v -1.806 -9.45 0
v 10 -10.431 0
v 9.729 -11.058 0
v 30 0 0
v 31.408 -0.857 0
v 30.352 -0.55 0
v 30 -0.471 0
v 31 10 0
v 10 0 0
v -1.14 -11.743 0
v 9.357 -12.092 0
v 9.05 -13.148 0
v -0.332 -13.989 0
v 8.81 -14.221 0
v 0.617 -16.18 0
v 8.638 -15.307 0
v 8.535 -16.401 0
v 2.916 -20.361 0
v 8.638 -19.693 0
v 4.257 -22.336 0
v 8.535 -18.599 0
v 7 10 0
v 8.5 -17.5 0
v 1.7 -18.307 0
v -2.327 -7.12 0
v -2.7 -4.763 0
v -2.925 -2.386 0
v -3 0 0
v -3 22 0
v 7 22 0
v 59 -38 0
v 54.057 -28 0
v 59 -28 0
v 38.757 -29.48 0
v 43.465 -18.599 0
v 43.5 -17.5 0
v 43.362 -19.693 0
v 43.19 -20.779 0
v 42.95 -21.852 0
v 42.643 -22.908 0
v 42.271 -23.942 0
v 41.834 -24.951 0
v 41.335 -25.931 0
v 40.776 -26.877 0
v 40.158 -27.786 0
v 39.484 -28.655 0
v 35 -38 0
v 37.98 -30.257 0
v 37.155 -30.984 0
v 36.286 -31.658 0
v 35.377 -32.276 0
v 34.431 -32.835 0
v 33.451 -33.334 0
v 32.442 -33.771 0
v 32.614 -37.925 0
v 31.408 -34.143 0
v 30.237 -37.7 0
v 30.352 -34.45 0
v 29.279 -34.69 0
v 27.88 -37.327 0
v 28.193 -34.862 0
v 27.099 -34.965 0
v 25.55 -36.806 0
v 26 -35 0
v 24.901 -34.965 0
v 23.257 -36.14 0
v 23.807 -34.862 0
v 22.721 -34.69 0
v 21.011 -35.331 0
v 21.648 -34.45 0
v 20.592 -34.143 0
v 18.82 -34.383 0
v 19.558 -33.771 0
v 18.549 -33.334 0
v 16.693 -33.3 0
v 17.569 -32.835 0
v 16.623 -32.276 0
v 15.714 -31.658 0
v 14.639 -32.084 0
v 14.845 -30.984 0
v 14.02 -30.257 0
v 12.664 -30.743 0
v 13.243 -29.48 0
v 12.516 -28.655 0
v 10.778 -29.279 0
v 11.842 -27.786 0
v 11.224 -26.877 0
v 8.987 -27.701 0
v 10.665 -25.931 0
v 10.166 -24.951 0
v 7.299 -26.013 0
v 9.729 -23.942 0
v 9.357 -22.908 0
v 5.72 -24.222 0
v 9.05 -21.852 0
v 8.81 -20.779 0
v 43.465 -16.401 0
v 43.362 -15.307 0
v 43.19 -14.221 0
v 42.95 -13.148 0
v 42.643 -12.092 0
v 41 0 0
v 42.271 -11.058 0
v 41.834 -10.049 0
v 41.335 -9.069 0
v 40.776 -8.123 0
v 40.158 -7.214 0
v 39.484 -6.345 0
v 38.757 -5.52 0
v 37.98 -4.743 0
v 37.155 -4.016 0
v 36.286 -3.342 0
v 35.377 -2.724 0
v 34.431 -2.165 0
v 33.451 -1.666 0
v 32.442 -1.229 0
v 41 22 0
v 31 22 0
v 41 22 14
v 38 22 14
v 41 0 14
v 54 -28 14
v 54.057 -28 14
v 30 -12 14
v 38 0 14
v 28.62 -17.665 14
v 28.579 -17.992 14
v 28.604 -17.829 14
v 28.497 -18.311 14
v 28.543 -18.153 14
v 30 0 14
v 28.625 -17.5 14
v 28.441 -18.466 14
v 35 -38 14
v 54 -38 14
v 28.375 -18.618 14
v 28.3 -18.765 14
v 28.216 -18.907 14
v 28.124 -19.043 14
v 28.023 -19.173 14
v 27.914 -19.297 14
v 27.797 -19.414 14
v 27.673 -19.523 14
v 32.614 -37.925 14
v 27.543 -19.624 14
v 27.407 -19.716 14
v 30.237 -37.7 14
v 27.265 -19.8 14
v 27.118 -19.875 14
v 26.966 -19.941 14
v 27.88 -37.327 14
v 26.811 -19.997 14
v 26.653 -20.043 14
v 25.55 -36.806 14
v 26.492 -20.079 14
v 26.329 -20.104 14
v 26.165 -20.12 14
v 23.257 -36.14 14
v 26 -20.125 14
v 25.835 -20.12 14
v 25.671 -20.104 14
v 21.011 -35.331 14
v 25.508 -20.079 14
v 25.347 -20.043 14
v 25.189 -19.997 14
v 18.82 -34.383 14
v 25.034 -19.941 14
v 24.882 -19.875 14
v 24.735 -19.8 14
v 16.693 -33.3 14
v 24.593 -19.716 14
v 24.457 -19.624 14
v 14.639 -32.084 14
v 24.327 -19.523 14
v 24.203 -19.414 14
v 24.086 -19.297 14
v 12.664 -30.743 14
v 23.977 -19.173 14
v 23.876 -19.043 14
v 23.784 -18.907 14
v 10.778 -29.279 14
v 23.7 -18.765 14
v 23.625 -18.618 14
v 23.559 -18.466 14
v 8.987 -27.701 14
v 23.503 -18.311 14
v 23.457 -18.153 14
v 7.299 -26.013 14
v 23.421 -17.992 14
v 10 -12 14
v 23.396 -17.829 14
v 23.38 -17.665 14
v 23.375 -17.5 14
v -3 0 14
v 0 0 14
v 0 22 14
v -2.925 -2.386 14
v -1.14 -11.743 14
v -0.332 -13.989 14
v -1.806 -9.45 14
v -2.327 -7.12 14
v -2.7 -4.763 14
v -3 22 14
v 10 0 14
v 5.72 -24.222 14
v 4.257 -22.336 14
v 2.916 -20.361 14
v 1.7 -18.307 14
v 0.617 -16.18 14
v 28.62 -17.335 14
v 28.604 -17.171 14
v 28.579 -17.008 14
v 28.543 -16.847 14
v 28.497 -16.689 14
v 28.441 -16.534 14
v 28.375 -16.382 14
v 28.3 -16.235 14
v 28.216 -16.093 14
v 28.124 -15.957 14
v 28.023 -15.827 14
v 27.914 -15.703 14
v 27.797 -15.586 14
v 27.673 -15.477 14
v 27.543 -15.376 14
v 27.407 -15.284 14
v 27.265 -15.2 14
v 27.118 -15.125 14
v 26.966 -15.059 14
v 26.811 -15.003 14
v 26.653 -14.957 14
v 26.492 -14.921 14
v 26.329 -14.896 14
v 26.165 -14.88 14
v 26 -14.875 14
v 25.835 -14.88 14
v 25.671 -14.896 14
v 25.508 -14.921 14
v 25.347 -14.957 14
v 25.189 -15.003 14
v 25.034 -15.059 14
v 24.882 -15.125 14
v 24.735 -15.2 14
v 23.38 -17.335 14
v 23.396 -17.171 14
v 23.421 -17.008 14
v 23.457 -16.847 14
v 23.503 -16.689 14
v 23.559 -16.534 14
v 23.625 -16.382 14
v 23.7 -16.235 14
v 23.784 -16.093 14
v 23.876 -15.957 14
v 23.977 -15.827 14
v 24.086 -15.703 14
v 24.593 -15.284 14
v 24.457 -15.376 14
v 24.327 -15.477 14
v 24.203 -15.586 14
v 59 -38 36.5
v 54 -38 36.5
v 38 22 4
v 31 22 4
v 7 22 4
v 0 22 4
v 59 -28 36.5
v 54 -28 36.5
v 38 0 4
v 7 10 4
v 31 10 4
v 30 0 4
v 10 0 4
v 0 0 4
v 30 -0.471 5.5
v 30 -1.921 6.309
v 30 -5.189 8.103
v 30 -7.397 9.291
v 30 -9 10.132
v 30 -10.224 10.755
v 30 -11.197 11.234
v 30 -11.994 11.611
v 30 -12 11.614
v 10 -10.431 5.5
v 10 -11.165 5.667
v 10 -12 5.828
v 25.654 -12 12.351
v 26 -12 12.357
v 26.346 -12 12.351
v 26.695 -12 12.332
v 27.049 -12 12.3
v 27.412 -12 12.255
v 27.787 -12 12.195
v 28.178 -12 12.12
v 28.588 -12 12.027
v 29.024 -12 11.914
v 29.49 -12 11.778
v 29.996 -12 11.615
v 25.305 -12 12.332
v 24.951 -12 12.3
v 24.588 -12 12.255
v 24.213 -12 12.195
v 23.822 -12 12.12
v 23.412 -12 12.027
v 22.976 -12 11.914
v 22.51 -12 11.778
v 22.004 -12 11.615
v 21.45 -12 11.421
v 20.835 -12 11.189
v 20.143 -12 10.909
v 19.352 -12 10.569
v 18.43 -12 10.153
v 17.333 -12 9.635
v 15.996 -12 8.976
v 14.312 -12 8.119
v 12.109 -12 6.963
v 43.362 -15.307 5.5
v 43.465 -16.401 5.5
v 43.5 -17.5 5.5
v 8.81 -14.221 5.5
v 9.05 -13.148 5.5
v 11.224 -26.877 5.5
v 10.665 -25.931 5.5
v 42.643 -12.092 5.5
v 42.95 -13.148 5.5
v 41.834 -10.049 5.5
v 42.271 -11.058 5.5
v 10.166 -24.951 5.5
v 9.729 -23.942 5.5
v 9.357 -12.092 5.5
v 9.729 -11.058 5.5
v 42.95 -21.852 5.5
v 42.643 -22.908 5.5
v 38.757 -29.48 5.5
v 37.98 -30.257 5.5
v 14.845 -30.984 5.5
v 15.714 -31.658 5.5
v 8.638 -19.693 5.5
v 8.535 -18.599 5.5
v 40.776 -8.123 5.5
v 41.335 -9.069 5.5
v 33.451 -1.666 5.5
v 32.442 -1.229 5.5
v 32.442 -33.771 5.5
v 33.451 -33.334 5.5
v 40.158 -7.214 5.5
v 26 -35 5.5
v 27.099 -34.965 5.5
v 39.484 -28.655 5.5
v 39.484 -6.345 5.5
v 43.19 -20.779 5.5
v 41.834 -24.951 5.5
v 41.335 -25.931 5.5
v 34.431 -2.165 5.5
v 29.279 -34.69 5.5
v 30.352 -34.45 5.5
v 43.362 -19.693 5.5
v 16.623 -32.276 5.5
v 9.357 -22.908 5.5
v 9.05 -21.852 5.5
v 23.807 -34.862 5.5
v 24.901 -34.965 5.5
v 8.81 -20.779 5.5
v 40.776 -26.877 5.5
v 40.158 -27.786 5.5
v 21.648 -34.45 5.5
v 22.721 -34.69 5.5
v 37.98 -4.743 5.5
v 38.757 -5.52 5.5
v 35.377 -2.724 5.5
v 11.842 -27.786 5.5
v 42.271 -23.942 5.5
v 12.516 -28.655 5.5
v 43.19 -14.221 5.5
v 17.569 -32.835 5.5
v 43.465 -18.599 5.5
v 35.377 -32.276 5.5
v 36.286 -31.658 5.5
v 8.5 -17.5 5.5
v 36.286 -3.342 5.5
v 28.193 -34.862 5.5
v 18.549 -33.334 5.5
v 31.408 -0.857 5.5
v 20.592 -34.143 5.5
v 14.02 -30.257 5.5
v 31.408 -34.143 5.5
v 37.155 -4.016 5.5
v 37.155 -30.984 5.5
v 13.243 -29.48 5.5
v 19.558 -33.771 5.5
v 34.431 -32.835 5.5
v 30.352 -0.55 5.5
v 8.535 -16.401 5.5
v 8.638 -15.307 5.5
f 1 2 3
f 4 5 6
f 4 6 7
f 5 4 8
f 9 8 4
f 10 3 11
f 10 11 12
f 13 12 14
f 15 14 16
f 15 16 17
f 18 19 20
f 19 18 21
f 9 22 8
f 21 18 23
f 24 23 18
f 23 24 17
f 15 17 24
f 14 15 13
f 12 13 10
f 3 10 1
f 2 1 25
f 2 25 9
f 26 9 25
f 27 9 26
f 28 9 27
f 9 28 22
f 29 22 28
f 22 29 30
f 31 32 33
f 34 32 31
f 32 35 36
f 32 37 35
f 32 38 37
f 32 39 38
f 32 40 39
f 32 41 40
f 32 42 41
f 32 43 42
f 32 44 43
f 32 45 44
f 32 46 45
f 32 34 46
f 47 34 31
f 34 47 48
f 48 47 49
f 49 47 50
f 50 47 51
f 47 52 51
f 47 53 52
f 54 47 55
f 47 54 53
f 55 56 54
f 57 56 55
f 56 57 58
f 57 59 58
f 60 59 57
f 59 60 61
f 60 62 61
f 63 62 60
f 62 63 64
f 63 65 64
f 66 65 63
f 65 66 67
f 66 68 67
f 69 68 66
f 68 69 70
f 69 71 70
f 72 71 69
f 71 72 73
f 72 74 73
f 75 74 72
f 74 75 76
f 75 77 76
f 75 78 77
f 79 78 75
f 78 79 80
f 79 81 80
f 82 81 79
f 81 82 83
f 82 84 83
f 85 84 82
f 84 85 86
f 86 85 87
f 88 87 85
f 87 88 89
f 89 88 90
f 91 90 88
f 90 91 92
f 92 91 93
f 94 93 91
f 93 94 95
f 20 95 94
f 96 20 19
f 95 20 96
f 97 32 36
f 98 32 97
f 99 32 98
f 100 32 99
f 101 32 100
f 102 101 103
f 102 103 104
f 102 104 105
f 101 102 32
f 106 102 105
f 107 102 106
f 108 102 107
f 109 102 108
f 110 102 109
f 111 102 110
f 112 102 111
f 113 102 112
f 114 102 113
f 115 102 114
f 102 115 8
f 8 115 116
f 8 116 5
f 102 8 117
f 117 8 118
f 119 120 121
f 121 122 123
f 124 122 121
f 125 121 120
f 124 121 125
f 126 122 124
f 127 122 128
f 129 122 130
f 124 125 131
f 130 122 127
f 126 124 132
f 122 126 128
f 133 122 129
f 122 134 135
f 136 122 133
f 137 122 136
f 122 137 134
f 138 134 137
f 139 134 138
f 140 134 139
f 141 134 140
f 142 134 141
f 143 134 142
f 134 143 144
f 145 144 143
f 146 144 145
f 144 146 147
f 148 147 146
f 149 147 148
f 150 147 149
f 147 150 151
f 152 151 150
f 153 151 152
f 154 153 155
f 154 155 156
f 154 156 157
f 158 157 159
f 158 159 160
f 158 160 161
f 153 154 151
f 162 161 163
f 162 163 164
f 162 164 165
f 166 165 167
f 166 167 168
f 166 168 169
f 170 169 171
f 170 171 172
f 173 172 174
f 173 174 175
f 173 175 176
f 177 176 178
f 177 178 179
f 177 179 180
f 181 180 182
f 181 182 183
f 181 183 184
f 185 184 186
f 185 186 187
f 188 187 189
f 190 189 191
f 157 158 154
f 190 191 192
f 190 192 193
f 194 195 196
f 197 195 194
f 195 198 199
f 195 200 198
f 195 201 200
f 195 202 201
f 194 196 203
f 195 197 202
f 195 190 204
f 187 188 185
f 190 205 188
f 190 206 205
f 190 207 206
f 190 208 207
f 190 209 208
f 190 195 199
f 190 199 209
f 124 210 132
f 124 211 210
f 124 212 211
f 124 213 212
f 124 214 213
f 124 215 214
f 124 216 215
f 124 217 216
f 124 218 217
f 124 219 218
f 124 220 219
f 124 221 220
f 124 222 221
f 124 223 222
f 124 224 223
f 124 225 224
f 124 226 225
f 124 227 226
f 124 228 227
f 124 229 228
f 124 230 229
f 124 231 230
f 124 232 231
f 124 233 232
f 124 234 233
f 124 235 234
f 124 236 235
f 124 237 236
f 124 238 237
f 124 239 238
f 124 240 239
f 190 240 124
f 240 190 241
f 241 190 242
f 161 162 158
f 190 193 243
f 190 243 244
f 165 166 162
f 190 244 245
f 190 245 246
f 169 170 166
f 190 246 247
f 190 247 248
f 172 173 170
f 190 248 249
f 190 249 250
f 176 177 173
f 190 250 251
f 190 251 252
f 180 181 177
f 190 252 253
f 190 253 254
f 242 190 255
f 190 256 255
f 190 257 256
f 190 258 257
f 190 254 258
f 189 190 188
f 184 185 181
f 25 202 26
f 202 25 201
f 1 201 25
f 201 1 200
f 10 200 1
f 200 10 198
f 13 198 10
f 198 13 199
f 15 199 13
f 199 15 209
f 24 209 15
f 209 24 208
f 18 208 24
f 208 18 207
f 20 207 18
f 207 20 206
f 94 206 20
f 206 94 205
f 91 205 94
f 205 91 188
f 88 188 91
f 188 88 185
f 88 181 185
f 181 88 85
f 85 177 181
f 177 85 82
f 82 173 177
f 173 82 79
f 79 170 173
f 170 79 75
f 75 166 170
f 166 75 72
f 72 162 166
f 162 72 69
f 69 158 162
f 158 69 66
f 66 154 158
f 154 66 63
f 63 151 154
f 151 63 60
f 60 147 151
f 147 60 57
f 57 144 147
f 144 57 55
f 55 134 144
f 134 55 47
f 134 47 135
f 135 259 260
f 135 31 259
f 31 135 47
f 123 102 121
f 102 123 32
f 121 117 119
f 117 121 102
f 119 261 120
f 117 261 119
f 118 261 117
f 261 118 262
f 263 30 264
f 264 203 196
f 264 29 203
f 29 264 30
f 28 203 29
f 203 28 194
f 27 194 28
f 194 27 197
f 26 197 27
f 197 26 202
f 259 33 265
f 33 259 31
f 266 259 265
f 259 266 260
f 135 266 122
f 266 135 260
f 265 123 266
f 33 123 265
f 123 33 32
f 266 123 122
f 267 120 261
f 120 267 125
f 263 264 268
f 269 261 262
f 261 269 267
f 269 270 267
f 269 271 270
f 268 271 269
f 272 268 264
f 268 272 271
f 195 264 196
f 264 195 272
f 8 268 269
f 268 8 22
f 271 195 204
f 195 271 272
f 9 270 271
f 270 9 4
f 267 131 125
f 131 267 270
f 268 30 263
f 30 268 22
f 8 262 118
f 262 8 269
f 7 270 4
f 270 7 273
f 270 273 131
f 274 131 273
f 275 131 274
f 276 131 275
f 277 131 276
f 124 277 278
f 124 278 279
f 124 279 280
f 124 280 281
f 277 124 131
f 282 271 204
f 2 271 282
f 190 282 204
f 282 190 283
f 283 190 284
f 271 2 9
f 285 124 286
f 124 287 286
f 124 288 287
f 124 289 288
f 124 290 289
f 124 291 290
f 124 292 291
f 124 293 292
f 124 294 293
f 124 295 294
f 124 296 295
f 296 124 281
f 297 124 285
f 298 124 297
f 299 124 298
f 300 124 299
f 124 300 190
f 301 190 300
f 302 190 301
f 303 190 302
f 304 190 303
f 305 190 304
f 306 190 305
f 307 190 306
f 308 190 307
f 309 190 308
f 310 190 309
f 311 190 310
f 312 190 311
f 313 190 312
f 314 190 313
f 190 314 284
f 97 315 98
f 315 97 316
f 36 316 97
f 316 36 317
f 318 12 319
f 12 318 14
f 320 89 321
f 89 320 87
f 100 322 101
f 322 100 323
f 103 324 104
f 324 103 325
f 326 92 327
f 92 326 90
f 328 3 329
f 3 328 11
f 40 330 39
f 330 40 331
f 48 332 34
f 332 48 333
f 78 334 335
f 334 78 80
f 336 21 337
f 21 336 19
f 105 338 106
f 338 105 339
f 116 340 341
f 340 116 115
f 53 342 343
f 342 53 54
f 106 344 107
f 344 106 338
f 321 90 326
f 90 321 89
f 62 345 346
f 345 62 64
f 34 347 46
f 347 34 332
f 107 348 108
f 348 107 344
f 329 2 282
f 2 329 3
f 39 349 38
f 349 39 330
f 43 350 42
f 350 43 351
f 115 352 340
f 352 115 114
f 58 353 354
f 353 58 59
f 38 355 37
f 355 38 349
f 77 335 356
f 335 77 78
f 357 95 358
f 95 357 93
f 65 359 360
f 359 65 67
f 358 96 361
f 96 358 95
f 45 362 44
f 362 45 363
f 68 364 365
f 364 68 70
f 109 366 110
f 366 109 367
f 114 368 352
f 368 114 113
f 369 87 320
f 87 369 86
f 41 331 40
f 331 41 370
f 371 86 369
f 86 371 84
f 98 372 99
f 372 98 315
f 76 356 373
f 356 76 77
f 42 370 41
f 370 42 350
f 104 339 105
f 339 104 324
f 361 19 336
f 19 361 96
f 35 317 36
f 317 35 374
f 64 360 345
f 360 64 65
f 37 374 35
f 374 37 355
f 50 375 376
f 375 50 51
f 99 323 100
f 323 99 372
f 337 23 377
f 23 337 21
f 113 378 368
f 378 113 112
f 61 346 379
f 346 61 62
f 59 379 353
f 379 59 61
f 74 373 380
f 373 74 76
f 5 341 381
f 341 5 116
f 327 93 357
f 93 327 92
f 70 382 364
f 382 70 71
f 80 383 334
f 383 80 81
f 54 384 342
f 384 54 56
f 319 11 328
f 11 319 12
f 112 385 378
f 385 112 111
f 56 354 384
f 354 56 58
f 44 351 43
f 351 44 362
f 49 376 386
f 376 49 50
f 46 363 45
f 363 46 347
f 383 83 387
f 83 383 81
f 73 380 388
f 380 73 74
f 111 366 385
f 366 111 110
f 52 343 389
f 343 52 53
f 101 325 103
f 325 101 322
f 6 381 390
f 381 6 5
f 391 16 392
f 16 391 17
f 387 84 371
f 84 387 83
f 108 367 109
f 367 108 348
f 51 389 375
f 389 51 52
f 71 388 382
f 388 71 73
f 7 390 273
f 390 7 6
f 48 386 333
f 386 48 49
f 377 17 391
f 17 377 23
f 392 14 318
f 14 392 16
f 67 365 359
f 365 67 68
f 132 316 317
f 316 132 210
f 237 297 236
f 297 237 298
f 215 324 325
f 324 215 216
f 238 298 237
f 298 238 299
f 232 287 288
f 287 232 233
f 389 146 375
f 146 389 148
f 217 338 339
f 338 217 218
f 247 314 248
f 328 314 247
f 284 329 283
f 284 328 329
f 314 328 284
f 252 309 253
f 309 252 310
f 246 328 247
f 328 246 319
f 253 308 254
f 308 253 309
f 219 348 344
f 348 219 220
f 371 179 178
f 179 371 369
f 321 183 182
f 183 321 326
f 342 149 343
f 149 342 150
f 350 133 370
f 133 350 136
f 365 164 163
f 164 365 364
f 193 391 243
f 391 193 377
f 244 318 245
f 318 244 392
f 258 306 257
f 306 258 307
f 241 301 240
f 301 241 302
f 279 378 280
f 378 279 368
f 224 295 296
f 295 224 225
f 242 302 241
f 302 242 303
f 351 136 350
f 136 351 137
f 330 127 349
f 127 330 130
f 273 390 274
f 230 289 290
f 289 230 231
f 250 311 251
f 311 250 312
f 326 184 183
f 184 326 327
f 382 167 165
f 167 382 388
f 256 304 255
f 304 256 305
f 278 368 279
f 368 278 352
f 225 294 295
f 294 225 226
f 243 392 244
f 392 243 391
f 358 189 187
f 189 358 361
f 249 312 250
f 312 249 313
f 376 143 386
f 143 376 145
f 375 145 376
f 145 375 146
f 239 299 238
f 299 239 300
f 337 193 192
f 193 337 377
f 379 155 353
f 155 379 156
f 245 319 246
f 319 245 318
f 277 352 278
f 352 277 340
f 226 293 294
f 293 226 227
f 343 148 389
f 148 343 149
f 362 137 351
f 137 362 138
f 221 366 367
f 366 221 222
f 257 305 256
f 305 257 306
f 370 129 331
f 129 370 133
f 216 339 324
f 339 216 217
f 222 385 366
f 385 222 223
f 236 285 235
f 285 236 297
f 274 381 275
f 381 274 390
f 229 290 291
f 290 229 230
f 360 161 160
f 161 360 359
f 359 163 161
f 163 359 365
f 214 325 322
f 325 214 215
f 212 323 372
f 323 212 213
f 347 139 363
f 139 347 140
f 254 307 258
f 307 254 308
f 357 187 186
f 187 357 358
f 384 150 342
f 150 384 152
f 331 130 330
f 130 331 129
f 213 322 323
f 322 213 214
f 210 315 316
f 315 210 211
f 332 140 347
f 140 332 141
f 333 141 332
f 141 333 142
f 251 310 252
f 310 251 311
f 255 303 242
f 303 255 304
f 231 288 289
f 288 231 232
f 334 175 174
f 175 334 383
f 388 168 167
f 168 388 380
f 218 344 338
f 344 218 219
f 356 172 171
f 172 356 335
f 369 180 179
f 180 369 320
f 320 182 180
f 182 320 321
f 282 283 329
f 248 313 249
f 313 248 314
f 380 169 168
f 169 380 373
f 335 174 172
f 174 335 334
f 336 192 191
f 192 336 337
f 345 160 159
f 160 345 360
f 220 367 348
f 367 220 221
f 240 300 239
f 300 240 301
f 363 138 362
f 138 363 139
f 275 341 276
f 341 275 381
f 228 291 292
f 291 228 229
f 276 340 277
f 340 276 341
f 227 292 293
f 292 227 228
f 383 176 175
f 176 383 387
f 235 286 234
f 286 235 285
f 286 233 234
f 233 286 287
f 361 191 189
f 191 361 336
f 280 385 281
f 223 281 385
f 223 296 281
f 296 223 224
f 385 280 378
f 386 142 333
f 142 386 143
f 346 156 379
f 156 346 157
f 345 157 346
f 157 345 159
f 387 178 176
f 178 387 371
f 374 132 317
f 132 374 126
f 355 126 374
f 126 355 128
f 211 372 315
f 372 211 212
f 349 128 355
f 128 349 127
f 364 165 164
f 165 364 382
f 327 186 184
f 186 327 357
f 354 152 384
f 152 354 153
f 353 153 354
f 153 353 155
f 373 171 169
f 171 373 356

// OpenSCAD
$fn=100;
i=38;
epaisseur_bloc=14;
module empileur() {
	cube([38,10,20]);
	cube([7,22,20]);
	translate([31,0,0]) cube([7,22,20]);
	translate([10,-12,-50]) cube([20,12,100]);
	translate([7,10,-10]) cube([24,30,40]);
	translate([26,-17.5,-5]) cylinder(d=35,h=6.5);
	translate([26,-17.5,1.5]) cylinder(d1=35,d2=0,h=10);
}

module plaque() {
	intersection() {
		translate([i,0])circle(i);
		translate([0,-i])square([i,i]);
	}
	translate([i,-i])difference() {
		square([24,i]);
		translate([44-i,i])rotate([0,0,-65])
			square([50,30]);
	}
square([44,22]);
}

module pla() {
translate([-3,0,0])linear_extrude(height = epaisseur_bloc)plaque();
epaisseur_presse=5;
hauteur_presse=22.5;
translate([44+15-epaisseur_presse,-i,0])
cube([epaisseur_presse,10,hauteur_presse+epaisseur_bloc]);
}


difference() {
pla();
translate([0,0,epaisseur_bloc-10])empileur();
}
